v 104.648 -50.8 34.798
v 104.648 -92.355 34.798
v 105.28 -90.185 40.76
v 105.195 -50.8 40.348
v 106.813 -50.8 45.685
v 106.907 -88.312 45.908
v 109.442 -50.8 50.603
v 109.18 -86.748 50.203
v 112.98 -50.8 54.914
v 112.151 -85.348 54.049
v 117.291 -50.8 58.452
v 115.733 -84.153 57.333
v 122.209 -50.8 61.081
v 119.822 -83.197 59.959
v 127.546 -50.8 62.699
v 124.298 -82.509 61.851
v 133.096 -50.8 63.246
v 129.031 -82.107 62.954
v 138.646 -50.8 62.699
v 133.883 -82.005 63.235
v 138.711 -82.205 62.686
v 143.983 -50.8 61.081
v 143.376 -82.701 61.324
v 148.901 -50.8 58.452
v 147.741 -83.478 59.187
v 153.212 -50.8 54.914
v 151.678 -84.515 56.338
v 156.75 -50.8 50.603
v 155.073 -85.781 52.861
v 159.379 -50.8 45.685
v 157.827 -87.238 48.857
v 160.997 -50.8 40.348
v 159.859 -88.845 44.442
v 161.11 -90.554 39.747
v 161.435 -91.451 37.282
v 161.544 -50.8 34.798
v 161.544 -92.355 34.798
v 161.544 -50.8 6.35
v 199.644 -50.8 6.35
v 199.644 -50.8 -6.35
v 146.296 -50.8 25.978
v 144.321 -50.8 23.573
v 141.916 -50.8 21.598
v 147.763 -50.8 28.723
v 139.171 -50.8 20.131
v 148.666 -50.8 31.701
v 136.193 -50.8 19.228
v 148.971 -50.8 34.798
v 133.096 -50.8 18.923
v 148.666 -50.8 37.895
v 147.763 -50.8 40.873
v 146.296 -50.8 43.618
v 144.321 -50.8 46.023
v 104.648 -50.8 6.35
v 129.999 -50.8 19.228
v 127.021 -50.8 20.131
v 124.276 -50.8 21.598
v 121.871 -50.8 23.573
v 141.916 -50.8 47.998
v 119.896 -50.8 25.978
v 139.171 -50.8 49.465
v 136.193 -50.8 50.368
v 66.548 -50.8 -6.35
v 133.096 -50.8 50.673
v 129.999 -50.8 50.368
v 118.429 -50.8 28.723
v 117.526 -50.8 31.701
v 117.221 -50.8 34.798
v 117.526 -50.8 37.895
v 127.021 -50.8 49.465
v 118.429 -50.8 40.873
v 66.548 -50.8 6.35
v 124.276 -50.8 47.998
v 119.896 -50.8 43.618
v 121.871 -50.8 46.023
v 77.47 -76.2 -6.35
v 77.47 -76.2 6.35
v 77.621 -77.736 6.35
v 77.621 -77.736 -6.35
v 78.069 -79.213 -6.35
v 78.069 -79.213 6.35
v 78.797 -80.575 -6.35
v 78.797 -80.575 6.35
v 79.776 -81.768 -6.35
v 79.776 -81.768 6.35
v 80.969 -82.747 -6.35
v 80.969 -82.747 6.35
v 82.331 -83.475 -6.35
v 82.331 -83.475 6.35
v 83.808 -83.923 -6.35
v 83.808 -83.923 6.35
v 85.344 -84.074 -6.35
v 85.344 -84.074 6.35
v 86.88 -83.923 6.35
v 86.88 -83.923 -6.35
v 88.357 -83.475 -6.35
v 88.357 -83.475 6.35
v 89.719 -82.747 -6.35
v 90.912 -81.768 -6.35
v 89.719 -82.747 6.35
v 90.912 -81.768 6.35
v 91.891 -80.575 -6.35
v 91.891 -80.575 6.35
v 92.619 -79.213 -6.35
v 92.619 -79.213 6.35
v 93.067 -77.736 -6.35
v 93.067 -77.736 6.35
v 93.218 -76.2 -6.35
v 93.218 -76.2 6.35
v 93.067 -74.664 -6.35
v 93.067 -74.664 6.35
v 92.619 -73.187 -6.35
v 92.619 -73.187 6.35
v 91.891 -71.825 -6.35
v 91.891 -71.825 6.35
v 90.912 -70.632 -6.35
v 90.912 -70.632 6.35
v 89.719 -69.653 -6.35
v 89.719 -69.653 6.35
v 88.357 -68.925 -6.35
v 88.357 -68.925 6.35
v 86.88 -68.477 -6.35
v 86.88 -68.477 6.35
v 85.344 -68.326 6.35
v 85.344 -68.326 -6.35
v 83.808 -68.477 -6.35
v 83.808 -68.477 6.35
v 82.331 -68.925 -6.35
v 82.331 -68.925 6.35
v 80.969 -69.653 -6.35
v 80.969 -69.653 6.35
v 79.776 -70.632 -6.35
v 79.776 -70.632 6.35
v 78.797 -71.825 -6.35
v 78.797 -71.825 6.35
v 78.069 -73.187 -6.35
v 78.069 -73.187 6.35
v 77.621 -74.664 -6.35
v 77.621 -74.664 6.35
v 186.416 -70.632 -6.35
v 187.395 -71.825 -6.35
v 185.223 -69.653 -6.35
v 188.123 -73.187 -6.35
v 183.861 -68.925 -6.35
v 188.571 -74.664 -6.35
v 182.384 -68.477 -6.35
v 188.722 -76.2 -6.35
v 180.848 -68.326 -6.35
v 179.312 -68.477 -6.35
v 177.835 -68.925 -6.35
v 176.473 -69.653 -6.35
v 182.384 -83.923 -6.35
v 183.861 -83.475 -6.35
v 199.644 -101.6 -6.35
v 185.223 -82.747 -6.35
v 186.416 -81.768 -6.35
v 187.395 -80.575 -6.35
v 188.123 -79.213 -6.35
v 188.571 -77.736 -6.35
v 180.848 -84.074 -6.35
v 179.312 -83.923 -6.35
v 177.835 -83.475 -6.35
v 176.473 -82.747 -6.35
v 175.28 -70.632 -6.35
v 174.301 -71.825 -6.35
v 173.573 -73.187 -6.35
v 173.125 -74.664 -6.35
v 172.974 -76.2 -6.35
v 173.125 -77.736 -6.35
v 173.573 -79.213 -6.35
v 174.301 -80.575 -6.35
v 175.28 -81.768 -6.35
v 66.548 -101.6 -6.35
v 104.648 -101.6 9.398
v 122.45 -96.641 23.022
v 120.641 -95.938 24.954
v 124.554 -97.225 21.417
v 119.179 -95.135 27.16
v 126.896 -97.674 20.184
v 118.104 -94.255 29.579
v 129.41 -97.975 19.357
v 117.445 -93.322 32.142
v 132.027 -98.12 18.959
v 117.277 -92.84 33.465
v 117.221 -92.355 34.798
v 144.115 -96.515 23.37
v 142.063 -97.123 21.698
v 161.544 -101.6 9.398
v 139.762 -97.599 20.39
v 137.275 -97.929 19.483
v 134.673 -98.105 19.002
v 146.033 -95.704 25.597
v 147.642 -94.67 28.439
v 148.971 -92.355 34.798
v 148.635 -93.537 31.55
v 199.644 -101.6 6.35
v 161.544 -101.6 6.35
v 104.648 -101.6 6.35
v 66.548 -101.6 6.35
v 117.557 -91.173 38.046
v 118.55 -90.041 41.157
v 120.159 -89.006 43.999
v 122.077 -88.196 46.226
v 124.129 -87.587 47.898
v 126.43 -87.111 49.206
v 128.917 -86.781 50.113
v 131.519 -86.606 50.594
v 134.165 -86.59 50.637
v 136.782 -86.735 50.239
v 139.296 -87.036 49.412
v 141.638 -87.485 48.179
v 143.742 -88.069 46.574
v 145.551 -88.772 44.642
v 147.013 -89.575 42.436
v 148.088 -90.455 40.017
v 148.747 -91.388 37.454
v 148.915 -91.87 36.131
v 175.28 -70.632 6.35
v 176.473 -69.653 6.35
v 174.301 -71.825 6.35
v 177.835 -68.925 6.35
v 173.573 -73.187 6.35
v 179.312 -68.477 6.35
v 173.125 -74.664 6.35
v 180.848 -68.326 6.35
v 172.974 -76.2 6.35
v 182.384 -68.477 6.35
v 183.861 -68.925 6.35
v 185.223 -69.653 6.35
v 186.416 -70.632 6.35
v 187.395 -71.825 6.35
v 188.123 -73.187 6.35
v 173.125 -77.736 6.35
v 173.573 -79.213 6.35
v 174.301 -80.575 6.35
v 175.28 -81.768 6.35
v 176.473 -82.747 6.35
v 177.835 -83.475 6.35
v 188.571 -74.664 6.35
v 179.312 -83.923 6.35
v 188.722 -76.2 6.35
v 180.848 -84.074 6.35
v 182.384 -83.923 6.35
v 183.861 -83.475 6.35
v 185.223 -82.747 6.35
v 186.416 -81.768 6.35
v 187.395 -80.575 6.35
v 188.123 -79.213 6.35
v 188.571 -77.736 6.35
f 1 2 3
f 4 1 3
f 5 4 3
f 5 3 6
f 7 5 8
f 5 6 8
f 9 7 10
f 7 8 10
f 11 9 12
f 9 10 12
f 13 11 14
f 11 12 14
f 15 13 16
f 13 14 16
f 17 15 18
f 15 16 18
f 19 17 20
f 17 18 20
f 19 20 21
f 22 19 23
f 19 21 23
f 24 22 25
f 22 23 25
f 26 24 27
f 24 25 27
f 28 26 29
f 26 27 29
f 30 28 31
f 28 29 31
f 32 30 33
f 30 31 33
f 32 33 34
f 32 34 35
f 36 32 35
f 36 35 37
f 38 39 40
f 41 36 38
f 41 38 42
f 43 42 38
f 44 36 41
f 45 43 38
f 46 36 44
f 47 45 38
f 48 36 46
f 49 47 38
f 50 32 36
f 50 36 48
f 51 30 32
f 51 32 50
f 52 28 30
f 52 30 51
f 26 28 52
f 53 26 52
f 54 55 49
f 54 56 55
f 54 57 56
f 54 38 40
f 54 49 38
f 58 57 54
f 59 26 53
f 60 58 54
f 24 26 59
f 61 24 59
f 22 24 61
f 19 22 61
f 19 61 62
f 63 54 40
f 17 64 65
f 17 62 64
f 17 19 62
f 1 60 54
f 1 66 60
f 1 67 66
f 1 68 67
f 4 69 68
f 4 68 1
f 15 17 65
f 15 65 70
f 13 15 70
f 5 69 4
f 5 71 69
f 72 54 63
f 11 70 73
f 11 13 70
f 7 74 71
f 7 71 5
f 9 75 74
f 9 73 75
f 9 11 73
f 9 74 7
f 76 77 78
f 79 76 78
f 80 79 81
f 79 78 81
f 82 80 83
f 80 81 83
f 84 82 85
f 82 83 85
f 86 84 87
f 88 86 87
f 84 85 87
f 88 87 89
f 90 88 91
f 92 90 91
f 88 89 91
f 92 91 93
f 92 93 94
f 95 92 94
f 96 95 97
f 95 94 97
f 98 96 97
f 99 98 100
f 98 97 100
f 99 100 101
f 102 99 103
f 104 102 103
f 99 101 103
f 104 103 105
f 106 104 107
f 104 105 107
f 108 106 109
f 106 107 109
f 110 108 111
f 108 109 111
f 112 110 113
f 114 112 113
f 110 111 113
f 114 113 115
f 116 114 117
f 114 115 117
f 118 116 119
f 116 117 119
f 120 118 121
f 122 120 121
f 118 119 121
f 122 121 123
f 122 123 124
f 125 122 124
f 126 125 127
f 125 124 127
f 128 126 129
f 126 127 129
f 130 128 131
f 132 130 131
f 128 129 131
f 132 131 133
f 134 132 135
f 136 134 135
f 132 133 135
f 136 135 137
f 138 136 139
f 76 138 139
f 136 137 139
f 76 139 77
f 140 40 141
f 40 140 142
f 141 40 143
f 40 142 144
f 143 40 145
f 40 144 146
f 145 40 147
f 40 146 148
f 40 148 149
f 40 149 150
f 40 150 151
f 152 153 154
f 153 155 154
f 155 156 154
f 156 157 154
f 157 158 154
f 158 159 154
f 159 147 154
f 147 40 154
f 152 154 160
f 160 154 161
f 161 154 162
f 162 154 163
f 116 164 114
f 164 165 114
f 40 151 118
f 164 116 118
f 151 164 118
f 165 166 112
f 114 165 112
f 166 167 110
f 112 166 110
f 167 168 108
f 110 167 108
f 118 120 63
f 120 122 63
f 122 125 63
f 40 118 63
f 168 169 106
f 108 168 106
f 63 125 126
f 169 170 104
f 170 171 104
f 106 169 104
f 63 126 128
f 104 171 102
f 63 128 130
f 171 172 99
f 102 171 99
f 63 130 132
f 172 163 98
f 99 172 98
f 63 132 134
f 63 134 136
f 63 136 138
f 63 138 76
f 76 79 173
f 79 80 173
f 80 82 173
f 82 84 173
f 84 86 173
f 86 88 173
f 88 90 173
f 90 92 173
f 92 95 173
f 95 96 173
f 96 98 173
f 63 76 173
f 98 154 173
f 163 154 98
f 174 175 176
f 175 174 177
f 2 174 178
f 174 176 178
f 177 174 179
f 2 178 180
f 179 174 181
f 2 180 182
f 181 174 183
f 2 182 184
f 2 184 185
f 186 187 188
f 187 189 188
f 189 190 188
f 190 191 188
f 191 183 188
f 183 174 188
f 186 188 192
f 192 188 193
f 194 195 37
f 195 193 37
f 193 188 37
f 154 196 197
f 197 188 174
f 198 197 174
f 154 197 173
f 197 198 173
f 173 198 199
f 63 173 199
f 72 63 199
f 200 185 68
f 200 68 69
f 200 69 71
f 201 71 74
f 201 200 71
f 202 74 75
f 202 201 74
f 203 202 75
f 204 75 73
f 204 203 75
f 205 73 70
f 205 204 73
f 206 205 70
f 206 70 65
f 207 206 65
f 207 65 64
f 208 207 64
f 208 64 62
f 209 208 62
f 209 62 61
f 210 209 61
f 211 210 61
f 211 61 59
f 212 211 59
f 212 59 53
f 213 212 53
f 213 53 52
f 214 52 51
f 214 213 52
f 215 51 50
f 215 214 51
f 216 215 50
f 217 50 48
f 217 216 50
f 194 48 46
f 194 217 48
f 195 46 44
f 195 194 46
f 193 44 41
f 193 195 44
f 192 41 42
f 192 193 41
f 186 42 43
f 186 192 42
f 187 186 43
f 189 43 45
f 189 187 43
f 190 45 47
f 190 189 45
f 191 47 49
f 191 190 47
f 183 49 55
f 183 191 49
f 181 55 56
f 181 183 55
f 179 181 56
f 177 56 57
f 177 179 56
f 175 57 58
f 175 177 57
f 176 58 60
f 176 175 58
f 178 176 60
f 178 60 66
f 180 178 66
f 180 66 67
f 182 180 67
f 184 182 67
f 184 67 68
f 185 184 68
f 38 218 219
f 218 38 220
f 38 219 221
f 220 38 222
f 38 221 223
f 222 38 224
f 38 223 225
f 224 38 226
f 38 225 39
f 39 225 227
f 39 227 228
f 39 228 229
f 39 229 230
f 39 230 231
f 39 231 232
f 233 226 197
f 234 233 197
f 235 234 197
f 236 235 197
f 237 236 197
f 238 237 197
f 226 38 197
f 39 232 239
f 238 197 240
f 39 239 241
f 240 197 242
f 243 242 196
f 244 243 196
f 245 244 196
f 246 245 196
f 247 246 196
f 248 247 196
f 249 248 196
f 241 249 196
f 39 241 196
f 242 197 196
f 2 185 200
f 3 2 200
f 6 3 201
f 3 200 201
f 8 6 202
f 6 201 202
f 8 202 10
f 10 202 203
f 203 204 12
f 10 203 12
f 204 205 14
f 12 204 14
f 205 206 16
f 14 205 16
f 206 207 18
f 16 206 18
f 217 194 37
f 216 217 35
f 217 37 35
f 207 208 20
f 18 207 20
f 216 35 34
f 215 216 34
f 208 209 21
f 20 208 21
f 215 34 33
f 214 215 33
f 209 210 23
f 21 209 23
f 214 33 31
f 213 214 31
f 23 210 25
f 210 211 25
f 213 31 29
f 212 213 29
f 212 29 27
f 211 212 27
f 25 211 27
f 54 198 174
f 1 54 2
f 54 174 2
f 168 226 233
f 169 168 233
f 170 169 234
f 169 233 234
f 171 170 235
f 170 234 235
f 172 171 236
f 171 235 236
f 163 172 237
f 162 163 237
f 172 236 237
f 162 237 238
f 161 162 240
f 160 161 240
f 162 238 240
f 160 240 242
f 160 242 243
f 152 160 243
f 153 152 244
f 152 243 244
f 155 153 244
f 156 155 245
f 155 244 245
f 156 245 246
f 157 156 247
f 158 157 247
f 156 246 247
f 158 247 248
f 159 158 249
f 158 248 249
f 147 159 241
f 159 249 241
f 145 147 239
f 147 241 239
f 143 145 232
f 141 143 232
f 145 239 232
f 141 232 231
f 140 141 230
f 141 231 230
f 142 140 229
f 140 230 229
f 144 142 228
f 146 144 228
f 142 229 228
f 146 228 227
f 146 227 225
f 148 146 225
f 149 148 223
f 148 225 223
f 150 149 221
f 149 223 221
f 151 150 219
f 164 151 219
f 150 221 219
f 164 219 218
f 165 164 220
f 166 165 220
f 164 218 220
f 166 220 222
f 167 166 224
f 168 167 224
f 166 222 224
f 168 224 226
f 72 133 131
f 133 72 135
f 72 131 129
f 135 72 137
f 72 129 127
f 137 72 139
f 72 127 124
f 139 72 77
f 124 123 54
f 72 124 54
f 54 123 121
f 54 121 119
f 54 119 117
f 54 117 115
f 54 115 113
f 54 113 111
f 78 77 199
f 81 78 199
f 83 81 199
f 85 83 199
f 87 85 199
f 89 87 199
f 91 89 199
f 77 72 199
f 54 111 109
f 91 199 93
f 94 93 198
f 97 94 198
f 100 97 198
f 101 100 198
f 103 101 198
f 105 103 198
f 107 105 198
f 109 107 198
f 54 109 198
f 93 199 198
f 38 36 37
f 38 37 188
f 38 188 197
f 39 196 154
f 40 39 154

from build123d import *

# Parameters (mm, degrees)
F0_R     = 15.875
F1_DEPTH = 50.8
F2_R     = 7.874
F3_DEPTH = 12.7
F5_DEPTH = 76.2
F6_ANGLE = 180


with BuildPart() as f1:
    # F0 (on Front) → F1 (new body)
    with BuildSketch(Plane.XZ):
        Polygon((66.548, -6.35), (66.548, 6.35), (28.448, 6.35), (-28.448, 6.35), (-66.548, 6.35), (-66.548, -6.35), (-28.448, -6.35), (28.448, -6.35), align=None)
        with BuildLine():
            Line((-28.448, 6.35), (28.448, 6.35))
            Line((28.448, 6.35), (28.448, 34.798))
            ThreePointArc((28.448, 34.798), (0, 63.246), (-28.448, 34.798))
            Line((-28.448, 34.798), (-28.448, 6.35))
        make_face()
        with Locations((0, 34.798)):
            Circle(F0_R, mode=Mode.SUBTRACT)
    extrude(amount=F1_DEPTH)

    # F2 (on face) → F3 (cut)
    with BuildSketch(Plane.XY.offset(6.35)):
        with Locations((47.752, -25.4)):
            Circle(F2_R)
        with Locations((-47.752, -25.4)):
            Circle(F2_R)
    extrude(amount=-F3_DEPTH, mode=Mode.SUBTRACT)

    # F4 (on face) → F5 (cut)
    with BuildSketch(Plane(origin=(-28.448, 0, 0), x_dir=(0, -1, 0), z_dir=(-1, 0, 0))):
        Polygon((0, 64.1047875036), (0, 34.798), (9.2448439504, 34.798), (19.9116422636, 64.1047875036), align=None)
        Polygon((0, 34.798), (0, 9.398), (9.2448439504, 34.798), align=None)
    extrude(amount=-F5_DEPTH, mode=Mode.SUBTRACT)


with BuildPart() as f1_1:
    # F6: moved
    add(f1.part.rotate(Axis((66.548, -50.8, 0), (0, 0, -1)), F6_ANGLE))


solid = f1_1.part
